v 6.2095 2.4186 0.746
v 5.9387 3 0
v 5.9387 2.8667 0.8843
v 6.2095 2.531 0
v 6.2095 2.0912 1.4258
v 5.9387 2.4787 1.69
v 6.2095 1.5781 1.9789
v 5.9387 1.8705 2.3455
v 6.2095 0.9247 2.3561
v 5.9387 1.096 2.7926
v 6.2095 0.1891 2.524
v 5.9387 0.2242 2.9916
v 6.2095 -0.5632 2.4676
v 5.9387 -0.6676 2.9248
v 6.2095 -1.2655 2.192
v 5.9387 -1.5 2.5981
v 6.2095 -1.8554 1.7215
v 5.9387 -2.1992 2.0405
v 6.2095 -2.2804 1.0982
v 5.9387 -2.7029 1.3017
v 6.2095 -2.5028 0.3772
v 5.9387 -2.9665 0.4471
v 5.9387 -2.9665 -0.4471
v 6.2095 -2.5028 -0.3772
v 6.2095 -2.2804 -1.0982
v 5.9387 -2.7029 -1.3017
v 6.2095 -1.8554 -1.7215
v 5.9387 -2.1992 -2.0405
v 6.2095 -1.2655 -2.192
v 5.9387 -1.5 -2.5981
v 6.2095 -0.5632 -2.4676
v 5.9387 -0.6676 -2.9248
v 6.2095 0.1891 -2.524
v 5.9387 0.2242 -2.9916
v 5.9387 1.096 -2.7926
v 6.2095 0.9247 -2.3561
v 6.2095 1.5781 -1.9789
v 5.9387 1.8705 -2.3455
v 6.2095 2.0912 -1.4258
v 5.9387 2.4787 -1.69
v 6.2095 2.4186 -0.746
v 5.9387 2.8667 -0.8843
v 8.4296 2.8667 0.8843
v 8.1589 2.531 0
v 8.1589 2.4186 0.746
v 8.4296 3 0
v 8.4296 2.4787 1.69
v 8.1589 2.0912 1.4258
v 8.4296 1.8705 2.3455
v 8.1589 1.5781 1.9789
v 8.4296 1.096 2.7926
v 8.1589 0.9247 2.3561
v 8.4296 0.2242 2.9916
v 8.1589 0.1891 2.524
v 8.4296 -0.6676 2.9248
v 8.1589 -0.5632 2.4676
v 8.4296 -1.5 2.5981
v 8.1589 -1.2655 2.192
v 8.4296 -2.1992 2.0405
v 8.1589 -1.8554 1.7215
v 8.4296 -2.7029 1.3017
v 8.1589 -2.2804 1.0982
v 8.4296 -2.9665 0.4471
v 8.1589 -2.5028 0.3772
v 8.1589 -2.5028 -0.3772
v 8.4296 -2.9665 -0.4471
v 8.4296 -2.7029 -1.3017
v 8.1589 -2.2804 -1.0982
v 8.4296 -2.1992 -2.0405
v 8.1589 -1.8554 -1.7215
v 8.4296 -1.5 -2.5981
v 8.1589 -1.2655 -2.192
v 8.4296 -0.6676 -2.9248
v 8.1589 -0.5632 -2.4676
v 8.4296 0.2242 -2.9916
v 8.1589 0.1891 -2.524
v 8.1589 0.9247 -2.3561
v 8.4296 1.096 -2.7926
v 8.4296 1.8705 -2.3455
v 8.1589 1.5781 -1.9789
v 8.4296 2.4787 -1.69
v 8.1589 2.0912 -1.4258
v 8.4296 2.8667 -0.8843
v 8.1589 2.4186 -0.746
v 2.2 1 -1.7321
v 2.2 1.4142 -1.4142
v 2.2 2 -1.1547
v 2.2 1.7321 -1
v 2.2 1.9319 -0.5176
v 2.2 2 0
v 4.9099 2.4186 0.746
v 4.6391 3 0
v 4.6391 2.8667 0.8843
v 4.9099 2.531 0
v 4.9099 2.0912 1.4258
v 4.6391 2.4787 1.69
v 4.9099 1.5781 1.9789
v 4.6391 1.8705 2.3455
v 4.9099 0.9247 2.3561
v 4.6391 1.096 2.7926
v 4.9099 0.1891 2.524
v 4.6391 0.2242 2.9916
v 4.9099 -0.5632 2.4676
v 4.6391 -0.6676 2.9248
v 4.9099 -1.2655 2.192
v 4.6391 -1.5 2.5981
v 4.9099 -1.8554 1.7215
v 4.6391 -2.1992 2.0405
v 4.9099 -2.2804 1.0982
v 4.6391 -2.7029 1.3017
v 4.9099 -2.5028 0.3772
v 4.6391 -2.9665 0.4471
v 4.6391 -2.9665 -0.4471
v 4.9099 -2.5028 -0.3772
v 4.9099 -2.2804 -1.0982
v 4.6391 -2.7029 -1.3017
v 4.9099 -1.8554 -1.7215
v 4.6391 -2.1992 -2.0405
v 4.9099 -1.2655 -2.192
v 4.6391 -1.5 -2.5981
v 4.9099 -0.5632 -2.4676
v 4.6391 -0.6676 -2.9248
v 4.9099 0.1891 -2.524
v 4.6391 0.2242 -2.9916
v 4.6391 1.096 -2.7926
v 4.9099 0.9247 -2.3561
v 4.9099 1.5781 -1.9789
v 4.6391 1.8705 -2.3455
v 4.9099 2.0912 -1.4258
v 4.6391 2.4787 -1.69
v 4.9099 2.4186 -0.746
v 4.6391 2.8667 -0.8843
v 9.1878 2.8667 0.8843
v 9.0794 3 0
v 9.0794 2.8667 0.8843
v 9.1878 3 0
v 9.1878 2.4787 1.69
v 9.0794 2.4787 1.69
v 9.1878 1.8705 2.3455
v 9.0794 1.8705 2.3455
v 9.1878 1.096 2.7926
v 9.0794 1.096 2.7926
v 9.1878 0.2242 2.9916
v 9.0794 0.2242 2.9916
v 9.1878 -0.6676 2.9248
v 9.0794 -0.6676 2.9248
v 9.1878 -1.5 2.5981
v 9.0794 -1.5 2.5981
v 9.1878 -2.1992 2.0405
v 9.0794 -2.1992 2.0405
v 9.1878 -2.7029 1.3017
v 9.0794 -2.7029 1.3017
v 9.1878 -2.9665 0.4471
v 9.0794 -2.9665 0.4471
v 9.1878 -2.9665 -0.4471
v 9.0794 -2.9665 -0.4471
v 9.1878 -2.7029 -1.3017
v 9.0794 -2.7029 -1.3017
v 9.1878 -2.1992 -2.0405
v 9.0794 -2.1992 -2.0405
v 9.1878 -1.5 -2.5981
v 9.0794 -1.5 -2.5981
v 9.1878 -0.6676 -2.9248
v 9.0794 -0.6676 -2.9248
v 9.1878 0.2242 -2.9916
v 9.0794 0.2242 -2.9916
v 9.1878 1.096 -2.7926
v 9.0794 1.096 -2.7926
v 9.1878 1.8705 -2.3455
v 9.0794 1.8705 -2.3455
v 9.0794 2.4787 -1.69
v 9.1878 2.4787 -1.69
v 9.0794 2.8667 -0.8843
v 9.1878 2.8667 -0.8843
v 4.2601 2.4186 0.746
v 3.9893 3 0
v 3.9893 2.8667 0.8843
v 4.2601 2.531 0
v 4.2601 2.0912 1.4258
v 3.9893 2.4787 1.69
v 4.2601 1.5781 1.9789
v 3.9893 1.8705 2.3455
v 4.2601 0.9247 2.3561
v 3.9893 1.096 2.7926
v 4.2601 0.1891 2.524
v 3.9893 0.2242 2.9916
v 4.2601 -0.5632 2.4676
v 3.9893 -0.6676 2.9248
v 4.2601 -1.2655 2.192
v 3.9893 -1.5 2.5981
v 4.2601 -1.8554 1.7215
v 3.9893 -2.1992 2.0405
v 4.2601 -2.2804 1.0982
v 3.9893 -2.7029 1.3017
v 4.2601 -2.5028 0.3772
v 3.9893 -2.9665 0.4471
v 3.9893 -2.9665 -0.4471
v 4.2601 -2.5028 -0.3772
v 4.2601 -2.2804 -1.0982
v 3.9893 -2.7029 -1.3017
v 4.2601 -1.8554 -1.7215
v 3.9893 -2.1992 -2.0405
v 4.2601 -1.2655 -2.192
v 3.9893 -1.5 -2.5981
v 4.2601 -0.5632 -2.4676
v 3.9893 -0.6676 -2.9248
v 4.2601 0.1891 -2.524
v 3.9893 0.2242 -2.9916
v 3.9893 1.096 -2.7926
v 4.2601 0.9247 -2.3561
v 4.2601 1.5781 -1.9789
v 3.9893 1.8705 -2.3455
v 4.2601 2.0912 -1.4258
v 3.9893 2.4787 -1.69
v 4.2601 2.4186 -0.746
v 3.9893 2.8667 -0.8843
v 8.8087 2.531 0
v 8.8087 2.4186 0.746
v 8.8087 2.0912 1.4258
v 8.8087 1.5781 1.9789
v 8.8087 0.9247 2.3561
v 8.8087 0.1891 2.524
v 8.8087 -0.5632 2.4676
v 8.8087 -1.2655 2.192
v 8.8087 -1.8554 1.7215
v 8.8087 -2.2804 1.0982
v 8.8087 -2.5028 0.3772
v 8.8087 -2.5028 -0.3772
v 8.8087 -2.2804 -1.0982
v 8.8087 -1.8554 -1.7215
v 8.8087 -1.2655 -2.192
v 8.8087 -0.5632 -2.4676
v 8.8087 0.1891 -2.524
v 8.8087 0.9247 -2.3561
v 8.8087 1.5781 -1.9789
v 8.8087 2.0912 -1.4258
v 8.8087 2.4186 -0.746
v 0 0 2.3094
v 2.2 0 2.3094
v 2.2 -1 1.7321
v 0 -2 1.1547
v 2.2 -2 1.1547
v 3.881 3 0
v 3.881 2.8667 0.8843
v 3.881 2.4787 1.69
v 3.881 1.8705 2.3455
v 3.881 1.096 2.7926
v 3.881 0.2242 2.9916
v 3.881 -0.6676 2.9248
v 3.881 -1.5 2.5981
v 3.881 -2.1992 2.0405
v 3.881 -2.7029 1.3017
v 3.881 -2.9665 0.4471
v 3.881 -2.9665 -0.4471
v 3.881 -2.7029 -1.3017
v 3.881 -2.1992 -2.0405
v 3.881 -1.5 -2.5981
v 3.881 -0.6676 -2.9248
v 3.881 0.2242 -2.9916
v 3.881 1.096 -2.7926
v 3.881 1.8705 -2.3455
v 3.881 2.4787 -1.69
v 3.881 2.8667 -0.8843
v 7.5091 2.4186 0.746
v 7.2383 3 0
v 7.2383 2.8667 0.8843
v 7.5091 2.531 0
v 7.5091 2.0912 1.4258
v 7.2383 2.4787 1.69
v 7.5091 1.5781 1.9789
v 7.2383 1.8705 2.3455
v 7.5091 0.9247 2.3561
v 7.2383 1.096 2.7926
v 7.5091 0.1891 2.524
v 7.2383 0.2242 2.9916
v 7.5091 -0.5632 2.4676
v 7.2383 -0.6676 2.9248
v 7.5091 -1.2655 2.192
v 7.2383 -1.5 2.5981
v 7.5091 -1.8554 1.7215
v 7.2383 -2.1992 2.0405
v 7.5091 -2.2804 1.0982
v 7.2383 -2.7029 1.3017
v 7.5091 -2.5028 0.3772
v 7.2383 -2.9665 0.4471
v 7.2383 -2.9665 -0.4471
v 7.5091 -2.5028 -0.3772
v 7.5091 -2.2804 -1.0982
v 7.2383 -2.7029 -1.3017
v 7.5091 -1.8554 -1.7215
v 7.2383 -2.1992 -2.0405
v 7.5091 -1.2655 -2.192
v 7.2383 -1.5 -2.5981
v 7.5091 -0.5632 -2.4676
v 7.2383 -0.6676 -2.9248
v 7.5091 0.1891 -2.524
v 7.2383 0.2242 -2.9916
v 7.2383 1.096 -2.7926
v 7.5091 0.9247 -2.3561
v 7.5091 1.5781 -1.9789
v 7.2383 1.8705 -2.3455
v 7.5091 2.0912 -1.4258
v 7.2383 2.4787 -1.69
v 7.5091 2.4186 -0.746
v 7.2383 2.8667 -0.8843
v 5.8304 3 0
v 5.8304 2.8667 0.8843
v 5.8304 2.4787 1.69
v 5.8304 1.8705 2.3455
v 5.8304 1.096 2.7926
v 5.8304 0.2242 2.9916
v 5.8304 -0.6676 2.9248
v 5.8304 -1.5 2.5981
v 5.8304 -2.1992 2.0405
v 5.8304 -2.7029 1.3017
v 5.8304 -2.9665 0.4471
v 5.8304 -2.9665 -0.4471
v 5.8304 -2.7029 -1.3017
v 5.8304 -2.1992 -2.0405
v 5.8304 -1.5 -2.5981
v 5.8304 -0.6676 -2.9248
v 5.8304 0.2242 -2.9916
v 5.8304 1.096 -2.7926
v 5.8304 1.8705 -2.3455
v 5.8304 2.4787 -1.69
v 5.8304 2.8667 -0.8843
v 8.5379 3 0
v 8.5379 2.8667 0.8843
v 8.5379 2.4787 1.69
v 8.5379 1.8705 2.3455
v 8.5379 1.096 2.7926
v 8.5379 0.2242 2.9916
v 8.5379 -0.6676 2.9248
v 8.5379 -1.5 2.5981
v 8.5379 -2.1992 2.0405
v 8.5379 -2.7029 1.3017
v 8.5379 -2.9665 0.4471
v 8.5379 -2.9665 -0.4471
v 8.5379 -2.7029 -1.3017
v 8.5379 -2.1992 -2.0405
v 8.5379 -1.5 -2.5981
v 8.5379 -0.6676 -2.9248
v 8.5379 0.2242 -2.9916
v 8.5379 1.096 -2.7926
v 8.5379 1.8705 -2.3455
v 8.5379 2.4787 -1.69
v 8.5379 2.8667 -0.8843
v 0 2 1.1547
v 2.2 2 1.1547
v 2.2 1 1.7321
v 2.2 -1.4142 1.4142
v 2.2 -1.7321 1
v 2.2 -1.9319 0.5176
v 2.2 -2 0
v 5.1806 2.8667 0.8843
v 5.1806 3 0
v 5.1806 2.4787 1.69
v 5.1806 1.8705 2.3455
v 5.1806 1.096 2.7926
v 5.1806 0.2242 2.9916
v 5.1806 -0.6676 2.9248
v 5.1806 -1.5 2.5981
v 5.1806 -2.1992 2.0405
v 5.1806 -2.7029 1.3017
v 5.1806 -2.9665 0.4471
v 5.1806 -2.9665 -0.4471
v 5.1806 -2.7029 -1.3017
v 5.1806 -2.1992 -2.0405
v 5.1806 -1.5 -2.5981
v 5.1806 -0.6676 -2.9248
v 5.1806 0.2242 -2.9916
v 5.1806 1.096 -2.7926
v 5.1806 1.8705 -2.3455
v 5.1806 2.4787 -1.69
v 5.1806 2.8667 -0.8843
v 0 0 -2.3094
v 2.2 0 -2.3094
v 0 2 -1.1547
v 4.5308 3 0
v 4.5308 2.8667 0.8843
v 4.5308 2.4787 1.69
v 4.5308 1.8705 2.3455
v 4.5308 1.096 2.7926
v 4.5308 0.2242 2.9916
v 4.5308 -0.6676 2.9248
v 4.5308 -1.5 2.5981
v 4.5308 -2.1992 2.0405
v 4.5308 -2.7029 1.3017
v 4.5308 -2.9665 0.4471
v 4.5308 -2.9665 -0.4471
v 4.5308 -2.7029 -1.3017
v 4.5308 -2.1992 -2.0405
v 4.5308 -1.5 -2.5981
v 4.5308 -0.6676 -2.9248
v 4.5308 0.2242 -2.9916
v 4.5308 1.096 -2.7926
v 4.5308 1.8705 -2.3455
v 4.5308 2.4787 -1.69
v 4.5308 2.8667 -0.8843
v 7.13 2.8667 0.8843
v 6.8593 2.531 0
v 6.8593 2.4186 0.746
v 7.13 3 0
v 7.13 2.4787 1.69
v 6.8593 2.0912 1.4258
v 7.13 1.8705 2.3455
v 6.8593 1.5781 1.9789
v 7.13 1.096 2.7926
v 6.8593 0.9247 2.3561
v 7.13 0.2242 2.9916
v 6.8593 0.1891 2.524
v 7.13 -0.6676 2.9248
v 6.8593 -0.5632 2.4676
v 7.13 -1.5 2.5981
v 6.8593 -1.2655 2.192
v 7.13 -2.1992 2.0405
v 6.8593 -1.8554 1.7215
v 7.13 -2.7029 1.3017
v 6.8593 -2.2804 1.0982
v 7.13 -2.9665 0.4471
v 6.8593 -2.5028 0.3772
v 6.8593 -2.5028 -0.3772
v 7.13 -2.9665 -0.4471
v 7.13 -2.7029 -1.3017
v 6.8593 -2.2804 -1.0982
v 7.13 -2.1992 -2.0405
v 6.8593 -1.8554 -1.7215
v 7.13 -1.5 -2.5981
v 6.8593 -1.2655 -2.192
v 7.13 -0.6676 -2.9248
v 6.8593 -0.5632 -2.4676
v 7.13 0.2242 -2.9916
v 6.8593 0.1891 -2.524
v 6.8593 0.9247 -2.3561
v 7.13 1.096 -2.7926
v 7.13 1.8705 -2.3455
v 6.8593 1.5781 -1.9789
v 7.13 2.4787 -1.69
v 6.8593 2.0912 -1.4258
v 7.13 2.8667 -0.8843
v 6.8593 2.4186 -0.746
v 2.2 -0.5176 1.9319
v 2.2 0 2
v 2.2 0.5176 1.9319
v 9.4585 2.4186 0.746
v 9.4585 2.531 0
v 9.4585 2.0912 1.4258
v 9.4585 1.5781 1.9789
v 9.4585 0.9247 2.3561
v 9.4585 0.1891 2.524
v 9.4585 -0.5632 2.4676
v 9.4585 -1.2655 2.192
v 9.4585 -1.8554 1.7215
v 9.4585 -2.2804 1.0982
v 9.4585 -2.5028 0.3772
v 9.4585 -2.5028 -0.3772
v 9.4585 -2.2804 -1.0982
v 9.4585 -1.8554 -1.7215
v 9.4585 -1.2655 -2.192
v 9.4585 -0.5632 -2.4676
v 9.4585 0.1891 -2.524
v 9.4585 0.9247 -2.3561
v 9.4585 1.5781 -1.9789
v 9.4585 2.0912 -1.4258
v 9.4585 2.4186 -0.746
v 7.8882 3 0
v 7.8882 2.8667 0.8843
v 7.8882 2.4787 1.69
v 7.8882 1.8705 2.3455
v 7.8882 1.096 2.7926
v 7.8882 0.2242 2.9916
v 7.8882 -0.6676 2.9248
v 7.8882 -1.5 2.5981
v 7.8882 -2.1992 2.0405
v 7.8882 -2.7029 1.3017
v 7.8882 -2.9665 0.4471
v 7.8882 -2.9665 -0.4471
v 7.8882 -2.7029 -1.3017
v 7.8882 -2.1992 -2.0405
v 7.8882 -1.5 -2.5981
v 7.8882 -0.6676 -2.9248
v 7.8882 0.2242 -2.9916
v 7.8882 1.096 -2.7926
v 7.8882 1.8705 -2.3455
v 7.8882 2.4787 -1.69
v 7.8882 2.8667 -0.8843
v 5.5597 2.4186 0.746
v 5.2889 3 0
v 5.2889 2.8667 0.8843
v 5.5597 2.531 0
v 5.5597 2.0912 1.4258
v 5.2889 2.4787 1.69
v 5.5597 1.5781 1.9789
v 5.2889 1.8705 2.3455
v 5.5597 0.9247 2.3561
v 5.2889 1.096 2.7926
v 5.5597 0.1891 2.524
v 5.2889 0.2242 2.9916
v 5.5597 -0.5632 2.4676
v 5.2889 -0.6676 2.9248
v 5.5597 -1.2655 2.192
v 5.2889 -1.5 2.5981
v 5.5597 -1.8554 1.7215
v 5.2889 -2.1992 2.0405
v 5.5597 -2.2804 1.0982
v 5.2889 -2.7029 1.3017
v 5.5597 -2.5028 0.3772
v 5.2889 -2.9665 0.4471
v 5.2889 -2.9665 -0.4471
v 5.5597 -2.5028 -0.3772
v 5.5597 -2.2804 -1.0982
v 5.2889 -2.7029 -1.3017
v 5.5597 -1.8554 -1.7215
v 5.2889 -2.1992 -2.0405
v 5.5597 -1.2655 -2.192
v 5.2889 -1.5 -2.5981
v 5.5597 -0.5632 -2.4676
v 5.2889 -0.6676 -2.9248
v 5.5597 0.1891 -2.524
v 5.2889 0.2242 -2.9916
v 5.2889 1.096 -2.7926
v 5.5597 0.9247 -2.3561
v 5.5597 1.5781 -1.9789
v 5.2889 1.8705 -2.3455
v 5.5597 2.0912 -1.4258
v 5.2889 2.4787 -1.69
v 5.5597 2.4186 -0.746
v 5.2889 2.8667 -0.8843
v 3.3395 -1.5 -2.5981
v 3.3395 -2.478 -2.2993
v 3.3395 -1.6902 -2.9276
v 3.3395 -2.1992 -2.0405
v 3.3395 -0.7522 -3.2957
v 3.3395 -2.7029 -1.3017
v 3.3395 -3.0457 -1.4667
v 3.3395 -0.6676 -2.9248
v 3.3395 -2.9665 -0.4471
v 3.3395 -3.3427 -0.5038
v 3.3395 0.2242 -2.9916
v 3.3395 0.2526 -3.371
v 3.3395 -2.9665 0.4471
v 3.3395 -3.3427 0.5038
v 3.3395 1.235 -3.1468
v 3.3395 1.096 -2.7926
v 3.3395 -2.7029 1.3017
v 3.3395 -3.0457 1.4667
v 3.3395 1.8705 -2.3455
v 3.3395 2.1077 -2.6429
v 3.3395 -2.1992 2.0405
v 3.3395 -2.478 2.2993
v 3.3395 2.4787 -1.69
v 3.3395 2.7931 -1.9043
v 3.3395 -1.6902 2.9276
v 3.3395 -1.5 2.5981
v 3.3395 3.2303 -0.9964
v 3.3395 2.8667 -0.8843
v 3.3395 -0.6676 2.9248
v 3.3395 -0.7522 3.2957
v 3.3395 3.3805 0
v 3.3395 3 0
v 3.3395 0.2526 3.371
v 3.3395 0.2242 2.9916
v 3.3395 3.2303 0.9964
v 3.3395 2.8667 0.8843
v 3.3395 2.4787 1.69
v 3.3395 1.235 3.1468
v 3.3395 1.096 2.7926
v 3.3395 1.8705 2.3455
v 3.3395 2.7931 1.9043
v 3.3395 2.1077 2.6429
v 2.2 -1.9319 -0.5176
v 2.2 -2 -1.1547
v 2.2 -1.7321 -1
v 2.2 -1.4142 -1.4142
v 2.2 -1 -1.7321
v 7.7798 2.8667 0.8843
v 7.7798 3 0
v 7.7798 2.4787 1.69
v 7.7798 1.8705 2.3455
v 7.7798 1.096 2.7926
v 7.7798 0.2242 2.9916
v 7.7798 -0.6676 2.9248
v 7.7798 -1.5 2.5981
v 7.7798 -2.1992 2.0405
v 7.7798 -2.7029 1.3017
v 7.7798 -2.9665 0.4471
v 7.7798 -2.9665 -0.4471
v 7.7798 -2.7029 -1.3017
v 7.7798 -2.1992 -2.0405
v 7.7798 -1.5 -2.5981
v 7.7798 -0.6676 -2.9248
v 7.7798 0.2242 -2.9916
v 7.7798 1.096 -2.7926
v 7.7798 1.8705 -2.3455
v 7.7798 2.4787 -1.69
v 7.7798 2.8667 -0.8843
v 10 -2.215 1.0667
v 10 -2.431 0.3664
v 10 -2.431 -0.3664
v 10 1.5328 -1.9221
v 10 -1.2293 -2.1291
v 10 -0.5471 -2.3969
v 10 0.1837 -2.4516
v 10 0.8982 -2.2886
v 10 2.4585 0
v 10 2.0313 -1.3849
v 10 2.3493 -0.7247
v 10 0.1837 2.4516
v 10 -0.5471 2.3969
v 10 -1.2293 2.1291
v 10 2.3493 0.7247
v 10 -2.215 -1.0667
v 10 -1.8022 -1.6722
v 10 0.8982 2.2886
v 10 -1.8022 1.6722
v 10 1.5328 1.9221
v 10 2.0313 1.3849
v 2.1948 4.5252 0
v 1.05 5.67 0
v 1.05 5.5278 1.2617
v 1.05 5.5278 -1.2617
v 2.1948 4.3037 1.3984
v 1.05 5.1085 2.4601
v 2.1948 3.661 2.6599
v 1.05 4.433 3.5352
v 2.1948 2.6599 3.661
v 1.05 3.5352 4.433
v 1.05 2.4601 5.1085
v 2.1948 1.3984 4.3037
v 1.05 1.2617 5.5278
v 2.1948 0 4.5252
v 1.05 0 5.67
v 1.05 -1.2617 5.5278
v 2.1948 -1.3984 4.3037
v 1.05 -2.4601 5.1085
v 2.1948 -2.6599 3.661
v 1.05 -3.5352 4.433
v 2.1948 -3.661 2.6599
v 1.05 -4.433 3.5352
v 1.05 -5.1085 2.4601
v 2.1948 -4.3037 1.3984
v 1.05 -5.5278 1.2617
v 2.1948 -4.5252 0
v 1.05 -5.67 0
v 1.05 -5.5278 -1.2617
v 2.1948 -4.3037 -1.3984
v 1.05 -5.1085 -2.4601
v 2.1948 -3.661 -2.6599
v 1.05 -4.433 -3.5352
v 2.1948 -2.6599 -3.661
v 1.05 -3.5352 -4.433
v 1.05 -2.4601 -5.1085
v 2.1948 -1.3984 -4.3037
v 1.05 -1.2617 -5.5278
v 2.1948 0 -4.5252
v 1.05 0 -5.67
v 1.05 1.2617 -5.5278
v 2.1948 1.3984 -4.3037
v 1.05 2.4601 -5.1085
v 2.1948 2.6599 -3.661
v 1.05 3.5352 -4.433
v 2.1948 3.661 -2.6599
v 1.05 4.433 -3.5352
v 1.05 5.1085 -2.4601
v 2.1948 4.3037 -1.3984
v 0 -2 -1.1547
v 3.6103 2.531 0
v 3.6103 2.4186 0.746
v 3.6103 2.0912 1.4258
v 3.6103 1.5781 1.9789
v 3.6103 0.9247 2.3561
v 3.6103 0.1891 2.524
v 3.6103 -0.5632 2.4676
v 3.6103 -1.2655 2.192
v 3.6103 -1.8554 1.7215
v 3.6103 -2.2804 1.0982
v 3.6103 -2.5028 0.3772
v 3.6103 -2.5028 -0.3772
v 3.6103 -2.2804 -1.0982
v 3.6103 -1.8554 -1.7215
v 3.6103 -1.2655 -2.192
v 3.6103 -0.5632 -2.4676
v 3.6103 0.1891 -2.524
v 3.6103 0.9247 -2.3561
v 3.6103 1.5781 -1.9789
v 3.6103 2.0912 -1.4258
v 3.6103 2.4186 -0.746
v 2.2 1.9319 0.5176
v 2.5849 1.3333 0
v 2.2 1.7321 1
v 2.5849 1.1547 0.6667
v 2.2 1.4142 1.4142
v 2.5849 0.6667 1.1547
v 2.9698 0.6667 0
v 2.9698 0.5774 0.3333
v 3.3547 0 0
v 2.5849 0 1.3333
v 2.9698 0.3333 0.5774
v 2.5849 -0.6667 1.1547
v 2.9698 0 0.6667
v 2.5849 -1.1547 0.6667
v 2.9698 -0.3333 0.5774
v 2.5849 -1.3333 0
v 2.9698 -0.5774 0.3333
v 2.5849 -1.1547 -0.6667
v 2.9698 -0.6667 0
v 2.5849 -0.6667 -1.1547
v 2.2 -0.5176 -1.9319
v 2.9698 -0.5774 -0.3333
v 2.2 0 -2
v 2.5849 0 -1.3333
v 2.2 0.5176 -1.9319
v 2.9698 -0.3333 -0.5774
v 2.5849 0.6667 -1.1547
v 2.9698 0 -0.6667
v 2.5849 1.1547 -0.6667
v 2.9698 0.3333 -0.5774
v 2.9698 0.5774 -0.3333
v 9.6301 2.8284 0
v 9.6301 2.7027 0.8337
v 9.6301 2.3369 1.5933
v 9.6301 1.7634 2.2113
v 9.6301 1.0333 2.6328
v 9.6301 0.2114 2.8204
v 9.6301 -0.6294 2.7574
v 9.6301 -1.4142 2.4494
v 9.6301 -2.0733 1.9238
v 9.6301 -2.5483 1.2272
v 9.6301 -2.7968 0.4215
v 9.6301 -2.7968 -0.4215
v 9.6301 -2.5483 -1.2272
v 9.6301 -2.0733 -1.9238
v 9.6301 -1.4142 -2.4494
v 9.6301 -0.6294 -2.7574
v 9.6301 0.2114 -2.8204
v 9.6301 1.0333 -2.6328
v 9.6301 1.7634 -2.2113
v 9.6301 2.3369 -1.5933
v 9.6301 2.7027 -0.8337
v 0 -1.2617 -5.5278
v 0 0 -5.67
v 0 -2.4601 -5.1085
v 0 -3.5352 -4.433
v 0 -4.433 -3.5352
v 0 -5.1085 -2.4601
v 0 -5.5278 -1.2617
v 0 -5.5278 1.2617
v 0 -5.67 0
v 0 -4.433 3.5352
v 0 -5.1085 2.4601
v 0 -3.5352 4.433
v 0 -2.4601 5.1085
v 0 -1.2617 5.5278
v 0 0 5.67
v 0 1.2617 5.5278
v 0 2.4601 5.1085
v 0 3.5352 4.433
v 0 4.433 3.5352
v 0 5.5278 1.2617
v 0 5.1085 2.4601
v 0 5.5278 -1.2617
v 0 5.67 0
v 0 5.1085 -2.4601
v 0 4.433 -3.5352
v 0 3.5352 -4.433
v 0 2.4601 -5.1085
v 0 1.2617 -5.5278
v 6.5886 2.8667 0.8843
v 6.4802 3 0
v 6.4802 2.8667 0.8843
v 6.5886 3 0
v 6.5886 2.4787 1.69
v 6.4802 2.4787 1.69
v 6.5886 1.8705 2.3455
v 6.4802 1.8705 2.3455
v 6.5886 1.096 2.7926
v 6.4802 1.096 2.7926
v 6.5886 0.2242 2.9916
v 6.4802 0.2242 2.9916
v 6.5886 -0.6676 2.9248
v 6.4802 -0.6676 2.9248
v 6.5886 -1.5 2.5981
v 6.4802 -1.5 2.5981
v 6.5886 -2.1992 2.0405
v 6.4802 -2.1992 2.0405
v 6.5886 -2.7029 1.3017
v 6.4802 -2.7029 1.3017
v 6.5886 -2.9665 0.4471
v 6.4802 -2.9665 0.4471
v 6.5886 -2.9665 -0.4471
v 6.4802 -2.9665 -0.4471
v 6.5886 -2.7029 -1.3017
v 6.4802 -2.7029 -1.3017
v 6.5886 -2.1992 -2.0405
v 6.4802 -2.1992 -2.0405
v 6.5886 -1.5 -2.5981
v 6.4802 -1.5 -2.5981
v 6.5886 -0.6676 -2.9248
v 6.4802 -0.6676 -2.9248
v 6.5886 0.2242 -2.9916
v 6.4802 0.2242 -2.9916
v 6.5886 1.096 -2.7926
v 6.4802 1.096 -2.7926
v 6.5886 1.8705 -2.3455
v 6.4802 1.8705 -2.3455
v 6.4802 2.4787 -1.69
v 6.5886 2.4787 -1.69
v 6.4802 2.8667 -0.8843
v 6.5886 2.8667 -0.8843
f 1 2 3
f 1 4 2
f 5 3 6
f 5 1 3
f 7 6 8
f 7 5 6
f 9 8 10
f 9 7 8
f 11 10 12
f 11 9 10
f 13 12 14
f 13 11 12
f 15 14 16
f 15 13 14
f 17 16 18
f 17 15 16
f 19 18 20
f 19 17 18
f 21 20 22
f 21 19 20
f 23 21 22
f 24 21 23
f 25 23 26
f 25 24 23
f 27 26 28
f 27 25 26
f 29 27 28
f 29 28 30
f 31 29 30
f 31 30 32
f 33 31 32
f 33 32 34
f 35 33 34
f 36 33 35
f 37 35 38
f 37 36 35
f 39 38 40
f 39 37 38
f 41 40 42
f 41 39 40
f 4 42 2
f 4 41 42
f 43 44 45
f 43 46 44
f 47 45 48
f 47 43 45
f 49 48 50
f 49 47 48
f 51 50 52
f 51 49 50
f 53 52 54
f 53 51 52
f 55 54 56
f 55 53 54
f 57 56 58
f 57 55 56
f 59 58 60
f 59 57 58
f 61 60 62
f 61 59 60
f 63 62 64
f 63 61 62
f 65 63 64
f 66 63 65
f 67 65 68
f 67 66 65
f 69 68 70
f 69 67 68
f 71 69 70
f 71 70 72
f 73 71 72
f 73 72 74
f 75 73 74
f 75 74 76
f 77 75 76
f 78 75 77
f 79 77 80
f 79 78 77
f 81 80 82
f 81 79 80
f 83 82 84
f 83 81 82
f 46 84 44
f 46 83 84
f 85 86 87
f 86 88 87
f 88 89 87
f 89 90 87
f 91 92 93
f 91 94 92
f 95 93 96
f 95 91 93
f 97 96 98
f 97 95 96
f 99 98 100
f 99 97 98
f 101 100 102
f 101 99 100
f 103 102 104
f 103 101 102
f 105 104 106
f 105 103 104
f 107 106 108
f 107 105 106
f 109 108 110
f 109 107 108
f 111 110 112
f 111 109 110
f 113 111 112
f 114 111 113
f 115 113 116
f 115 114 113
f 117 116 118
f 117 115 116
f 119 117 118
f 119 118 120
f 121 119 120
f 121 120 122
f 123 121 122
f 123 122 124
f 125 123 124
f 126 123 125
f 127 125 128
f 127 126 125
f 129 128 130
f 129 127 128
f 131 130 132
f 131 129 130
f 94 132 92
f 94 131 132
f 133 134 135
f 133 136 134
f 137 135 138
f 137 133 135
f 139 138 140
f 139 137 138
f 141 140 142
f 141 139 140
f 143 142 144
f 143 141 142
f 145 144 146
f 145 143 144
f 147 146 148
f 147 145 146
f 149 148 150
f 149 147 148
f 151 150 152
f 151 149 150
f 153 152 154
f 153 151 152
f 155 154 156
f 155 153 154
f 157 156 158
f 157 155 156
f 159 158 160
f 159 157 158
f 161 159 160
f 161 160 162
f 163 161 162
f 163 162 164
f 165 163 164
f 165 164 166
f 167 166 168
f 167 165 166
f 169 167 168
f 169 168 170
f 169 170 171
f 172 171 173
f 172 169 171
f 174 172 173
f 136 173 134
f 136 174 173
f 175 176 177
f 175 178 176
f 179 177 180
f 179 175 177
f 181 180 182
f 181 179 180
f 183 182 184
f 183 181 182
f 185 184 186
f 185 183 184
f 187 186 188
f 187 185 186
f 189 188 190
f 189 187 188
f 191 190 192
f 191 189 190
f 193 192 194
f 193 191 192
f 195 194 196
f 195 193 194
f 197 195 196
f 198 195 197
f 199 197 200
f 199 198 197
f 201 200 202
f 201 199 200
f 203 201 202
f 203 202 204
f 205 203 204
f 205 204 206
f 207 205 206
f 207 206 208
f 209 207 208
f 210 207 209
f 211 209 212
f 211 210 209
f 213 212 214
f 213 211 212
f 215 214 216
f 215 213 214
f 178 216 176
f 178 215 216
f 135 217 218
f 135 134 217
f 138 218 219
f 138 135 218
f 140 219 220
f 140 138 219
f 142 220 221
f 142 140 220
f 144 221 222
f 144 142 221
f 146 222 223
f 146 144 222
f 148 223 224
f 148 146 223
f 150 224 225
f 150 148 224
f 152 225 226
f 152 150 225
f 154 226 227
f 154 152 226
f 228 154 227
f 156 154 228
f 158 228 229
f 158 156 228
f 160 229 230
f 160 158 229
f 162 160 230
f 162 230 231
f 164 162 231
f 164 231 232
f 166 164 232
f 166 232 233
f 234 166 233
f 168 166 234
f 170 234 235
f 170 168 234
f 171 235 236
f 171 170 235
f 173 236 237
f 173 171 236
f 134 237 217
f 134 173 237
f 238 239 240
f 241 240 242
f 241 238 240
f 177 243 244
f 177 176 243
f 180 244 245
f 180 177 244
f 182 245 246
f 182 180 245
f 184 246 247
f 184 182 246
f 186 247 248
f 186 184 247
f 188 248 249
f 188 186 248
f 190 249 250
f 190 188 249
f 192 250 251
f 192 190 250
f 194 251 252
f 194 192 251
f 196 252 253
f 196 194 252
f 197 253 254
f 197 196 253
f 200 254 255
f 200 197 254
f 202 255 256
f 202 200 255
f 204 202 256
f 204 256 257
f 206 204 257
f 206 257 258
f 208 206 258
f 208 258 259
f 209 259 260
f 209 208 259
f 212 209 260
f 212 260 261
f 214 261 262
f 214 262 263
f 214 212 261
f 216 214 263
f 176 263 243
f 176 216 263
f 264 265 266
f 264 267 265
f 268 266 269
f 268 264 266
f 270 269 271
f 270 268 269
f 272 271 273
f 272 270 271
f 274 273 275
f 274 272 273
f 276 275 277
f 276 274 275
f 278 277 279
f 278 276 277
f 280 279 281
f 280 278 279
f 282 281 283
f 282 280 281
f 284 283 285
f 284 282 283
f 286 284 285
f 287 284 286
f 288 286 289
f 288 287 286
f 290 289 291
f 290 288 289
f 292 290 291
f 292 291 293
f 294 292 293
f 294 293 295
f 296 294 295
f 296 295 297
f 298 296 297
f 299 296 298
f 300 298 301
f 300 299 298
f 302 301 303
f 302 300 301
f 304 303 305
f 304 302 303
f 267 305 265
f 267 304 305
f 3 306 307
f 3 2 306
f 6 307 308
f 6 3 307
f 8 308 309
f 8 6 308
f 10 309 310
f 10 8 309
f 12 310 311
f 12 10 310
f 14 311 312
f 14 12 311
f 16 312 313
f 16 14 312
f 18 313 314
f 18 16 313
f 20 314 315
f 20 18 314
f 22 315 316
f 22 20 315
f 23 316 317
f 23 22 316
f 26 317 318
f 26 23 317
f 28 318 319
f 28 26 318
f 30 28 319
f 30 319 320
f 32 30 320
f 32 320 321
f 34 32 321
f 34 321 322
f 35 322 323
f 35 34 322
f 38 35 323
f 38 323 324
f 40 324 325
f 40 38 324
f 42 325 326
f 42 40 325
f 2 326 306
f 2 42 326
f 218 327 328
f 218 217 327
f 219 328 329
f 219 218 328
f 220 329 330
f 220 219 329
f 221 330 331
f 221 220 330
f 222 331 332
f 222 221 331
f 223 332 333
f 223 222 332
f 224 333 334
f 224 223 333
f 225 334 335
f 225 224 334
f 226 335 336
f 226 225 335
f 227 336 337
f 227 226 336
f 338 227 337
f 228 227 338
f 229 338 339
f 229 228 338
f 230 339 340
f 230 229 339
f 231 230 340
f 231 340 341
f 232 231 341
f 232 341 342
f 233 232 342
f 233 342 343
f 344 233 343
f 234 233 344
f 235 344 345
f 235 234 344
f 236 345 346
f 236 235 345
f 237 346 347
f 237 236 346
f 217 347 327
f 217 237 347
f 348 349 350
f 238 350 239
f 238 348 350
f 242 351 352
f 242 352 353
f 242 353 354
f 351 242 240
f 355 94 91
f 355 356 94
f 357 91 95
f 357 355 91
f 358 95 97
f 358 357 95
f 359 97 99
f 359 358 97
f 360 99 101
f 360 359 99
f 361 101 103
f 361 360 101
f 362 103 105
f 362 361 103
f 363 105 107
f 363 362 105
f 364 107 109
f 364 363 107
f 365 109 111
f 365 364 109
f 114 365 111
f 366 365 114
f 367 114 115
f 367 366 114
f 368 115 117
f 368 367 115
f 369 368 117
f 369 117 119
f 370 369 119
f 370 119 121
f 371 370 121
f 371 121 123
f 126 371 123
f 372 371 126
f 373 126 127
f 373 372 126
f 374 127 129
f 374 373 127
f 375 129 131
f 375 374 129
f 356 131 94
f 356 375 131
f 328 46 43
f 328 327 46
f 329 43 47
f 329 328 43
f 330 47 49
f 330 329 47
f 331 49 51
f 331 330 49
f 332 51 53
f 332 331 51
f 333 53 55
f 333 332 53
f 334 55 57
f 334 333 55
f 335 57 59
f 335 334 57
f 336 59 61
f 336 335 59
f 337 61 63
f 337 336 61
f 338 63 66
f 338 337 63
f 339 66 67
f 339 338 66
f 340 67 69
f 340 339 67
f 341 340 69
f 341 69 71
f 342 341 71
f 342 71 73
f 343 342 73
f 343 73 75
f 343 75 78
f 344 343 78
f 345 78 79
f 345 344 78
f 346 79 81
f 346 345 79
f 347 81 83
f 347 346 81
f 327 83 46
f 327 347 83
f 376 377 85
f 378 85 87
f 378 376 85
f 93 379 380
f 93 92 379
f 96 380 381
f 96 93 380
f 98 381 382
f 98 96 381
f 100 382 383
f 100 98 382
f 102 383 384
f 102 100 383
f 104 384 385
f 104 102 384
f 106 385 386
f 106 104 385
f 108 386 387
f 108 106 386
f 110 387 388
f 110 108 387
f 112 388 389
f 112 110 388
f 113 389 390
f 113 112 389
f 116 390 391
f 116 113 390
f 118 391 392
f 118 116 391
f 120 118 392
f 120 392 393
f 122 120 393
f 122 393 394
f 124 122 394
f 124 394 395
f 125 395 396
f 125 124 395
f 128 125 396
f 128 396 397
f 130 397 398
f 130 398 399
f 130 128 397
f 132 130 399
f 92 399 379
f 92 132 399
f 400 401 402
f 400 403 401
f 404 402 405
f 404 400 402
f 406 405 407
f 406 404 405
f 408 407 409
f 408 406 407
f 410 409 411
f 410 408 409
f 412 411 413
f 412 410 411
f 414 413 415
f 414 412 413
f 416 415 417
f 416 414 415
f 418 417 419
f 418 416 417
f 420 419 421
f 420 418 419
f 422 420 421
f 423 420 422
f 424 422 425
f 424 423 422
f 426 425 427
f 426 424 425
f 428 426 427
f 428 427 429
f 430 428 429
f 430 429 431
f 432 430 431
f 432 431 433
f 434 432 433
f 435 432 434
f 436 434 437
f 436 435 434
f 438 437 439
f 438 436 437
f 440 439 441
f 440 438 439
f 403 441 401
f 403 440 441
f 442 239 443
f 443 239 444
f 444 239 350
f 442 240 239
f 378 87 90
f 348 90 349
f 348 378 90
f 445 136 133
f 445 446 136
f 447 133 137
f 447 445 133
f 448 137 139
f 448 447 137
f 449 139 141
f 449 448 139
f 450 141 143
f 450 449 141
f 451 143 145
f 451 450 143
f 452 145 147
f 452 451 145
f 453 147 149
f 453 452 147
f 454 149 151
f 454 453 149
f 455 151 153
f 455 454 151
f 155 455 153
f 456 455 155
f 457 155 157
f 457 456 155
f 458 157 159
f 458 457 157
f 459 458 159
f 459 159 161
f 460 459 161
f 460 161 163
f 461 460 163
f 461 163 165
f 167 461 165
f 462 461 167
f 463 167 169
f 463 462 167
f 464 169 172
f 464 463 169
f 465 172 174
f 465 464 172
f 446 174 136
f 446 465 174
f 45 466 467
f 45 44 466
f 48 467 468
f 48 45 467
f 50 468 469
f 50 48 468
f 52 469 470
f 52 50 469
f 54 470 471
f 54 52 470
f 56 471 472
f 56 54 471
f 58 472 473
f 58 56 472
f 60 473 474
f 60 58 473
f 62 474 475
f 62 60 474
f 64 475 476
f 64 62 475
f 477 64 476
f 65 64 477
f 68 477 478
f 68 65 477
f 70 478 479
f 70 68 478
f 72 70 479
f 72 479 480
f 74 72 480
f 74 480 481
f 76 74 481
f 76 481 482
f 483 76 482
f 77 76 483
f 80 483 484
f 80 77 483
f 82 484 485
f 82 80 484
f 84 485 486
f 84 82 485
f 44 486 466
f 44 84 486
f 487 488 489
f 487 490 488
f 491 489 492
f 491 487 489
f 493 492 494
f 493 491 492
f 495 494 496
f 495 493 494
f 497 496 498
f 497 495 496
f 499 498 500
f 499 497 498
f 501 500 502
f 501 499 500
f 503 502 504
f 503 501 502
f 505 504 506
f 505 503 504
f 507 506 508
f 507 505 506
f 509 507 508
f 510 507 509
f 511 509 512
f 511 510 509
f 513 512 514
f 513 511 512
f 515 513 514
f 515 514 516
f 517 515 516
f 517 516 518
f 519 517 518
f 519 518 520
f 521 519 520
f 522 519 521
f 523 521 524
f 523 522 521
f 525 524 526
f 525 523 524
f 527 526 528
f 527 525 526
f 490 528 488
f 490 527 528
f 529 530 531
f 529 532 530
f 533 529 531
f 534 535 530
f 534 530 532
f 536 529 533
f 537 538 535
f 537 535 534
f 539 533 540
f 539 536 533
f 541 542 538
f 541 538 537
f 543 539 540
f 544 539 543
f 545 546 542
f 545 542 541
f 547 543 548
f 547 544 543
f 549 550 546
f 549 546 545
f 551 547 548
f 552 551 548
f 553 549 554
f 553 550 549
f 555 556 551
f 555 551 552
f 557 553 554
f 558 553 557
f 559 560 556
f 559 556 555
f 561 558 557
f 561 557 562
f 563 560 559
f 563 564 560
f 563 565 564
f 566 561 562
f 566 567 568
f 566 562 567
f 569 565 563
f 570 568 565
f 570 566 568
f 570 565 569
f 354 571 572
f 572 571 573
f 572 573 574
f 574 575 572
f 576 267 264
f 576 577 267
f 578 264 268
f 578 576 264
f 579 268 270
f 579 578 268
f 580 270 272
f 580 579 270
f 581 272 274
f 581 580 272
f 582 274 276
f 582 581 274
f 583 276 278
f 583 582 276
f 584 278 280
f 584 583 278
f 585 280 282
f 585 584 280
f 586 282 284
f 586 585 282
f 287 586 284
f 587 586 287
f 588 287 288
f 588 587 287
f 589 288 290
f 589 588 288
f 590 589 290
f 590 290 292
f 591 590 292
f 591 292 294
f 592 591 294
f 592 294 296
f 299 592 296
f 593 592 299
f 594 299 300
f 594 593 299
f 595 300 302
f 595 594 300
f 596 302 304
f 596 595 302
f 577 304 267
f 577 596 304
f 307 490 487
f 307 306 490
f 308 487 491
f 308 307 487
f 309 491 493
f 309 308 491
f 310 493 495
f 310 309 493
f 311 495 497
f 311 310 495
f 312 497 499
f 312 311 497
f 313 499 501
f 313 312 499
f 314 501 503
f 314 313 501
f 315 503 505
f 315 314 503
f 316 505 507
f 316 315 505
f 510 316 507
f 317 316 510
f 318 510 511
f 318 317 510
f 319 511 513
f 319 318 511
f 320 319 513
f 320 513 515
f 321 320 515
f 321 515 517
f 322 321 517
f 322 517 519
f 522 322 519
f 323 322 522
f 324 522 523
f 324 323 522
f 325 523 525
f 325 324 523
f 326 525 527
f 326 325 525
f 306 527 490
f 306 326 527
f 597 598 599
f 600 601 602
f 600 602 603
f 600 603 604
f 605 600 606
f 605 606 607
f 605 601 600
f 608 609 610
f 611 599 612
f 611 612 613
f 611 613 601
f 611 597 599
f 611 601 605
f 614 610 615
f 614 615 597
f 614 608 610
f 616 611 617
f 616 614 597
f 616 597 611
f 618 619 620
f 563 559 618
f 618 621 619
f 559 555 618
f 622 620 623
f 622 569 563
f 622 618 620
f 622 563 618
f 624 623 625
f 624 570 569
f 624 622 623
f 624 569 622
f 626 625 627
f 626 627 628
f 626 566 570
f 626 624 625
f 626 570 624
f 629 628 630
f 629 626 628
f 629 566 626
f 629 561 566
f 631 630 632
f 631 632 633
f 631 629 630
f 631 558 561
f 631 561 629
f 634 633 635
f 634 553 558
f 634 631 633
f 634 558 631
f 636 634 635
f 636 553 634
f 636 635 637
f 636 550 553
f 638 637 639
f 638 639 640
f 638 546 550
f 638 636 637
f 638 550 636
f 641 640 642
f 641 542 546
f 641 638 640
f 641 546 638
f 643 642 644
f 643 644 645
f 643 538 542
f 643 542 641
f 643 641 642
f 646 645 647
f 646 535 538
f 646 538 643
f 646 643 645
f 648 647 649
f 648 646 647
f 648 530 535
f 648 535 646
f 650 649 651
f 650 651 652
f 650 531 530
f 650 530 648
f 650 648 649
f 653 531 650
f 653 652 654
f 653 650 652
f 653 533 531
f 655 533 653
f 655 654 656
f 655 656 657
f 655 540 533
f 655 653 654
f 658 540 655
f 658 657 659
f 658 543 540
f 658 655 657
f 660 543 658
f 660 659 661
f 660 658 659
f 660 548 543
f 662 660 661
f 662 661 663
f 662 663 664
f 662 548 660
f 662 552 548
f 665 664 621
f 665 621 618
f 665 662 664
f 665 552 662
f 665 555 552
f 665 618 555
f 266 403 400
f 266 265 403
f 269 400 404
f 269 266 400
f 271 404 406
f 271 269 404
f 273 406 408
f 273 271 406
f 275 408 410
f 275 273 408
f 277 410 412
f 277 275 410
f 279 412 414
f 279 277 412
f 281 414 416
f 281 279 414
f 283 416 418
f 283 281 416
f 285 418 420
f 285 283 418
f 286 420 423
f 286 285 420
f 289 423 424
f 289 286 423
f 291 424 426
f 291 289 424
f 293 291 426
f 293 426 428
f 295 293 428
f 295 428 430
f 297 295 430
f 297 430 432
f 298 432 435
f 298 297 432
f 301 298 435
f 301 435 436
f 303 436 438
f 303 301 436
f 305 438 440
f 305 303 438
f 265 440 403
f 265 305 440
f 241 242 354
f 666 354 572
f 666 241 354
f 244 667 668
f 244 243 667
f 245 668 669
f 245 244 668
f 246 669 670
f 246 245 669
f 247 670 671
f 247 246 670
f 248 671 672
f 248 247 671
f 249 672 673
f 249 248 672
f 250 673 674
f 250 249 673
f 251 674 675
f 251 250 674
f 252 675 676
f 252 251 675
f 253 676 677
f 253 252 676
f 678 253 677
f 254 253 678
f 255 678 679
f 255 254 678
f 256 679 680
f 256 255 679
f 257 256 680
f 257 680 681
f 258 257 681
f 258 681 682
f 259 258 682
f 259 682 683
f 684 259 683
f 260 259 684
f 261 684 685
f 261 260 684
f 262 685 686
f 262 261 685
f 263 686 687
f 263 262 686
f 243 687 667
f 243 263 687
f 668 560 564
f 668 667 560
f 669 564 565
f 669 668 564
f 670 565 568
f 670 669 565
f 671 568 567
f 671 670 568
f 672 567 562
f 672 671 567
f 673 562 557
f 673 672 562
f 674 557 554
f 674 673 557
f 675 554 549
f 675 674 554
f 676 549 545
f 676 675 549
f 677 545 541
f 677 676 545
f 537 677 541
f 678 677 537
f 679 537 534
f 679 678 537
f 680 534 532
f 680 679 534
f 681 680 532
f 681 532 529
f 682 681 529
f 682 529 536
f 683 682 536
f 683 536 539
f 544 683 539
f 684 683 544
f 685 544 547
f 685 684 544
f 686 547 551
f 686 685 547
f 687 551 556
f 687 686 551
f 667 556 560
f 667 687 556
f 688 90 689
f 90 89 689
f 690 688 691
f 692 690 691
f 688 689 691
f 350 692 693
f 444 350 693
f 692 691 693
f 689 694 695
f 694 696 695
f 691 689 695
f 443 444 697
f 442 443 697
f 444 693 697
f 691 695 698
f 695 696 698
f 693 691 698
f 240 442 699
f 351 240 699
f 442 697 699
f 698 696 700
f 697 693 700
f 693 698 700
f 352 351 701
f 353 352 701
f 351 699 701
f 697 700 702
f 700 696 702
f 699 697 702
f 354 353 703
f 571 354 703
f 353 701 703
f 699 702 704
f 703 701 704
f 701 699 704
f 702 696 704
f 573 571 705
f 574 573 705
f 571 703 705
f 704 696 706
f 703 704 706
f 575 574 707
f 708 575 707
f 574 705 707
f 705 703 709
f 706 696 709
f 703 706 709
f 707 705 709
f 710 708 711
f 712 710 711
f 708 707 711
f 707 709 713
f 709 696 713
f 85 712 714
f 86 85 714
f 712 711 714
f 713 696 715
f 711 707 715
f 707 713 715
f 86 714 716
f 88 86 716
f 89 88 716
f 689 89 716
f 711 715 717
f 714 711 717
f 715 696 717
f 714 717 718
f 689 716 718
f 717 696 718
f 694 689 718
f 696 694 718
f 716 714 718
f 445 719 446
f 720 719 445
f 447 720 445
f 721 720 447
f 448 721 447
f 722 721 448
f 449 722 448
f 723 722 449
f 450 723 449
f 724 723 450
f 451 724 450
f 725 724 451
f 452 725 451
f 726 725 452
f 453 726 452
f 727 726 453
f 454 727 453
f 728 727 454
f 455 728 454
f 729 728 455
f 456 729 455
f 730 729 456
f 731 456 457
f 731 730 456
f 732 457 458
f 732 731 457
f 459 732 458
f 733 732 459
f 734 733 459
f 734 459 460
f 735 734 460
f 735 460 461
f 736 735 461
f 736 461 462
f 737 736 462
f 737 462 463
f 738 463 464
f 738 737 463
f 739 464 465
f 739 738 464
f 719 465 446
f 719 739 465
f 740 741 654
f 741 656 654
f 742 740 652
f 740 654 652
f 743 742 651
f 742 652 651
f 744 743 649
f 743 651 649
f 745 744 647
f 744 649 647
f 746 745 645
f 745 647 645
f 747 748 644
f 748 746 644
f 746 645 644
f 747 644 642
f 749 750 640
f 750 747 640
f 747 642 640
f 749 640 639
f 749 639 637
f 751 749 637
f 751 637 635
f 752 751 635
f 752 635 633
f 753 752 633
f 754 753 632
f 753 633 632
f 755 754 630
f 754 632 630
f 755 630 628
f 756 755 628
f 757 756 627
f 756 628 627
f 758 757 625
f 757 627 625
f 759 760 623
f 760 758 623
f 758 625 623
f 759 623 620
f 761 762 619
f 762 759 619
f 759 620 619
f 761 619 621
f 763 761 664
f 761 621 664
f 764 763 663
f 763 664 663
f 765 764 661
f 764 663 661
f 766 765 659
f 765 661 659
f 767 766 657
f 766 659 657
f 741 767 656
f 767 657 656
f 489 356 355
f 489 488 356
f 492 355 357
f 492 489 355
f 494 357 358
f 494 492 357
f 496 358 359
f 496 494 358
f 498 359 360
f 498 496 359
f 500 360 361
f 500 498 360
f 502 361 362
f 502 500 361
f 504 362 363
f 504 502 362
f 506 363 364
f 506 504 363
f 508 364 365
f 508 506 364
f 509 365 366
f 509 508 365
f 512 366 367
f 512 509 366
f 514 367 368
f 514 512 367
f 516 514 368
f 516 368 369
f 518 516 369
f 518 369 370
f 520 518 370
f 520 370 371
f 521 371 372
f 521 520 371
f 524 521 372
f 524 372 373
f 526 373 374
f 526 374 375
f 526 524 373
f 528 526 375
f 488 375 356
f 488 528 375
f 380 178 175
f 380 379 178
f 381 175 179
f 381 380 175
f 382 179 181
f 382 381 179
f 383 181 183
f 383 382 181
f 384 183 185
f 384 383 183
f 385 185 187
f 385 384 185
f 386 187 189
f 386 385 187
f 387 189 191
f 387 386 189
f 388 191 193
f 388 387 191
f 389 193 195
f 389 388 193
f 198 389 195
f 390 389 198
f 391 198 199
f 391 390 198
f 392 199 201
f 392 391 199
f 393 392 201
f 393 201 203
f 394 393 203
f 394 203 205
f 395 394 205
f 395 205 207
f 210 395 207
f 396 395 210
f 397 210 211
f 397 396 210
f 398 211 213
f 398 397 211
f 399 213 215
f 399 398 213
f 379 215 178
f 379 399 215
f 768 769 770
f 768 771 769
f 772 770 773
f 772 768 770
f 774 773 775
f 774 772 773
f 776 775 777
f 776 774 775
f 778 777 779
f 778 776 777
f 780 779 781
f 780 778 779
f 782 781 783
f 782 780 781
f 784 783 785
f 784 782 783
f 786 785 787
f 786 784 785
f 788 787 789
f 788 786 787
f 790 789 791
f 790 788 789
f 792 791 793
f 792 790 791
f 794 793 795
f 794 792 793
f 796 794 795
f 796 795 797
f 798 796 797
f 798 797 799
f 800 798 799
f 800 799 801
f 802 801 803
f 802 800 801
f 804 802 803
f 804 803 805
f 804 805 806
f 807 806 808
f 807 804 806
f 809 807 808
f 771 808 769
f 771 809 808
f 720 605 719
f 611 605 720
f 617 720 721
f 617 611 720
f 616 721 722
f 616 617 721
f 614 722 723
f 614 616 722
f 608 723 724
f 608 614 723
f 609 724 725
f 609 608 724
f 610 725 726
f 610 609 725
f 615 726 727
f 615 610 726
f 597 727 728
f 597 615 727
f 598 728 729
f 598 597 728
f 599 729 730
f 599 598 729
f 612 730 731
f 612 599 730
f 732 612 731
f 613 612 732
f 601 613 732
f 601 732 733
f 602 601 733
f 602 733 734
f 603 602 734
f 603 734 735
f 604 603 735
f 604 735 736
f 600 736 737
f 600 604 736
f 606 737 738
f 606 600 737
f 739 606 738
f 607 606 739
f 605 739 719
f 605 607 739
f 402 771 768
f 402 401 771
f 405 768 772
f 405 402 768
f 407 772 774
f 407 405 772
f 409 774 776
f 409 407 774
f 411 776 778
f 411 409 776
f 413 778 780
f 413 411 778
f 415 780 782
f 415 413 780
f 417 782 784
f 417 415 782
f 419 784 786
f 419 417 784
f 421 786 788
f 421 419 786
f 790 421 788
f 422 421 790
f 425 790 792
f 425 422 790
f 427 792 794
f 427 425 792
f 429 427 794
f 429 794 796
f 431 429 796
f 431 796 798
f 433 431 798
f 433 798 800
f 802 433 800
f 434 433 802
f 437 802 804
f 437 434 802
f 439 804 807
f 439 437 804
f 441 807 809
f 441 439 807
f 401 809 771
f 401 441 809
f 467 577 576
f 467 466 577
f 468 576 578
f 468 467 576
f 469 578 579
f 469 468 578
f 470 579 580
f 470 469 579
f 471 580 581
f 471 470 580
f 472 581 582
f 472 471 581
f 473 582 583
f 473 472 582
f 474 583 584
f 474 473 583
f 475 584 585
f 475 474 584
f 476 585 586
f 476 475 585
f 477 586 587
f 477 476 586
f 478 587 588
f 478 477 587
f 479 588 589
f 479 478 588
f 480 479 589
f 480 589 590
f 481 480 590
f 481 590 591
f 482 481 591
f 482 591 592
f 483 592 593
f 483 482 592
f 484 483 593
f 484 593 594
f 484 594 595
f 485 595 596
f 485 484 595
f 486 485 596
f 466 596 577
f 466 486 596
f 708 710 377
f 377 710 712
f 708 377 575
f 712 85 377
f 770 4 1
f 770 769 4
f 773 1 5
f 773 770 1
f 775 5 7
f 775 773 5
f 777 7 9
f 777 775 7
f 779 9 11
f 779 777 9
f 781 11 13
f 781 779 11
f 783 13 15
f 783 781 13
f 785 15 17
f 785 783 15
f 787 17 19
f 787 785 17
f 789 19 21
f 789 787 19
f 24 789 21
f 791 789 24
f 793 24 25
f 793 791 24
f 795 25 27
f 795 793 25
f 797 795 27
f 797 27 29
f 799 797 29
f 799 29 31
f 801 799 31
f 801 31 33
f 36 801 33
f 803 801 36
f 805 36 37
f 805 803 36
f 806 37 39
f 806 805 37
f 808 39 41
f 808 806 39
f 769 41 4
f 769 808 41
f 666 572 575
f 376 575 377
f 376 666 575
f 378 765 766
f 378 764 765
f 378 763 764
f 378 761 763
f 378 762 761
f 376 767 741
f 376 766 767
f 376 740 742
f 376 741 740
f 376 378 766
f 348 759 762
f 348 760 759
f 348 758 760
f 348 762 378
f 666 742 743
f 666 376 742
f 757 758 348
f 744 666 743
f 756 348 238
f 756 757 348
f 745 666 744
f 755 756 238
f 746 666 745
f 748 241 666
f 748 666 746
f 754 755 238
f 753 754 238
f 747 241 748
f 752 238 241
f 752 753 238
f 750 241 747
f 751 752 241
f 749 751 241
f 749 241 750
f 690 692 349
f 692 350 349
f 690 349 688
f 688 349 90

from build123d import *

# Parameters (mm, degrees)
HEXAGONSOCKET_DEPTH = 2.2
HEADFILLET_R        = 0.25
CHAMFER_2_SIZE      = 0.5415
SKETCH4_W           = 5
SKETCH4_H           = 5
LPATTERN10_COUNT    = 10
LPATTERN10_PITCH    = 0.6498


with BuildPart() as part:
    # Sketch1 → Base (revolve)
    with BuildSketch(Plane.XY):
        Polygon((0, 0), (0, 6.72), (3.72, 3), (10, 3), (10, 0), align=None)
    revolve(axis=Axis((-0.587069181, 0, 0), (1, 0, 0)))

    # Sketch2 → HexagonSocket (cut)
    with BuildSketch(Plane(origin=(0, 0, 0), x_dir=(0, 0, -1), z_dir=(1, 0, 0))):
        Polygon((2.309401077, 0), (1.154700538, 2), (-1.154700538, 2), (-2.309401077, 0), (-1.154700538, -2), (1.154700538, -2), align=None)
    extrude(amount=HEXAGONSOCKET_DEPTH, mode=Mode.SUBTRACT)

    # Sketch3 → Cut-Revolve1 (revolve, cut)
    with BuildSketch(Plane.XY):
        Polygon((2.2, 2), (3.354700538, 0), (2.2, 0), align=None)
    revolve(axis=Axis((-0.439109555, 0, 0), (1, 0, 0)), mode=Mode.SUBTRACT)

    # HeadFillet
    headfillet_edges = [part.edges().sort_by_distance(p)[0] for p in [
        (3.72, -3, 0),
    ]]
    fillet(headfillet_edges, radius=HEADFILLET_R)

    # Chamfer 2
    chamfer_2_edges = [part.edges().sort_by_distance(p)[0] for p in [
        (10, -3, 0),
    ]]
    chamfer(chamfer_2_edges, length=CHAMFER_2_SIZE)

    # Sketch4 → Cut-Revolve2 (revolve, cut)
    with BuildSketch(Plane(origin=(0, 0, 0), x_dir=(1, 0, 0), z_dir=(0, 1, 0))):
        with Locations((0.5, 8.17)):
            Rectangle(SKETCH4_W, SKETCH4_H)
    revolve(axis=Axis((11.853138686, 0, 0), (-1, 0, 0)), mode=Mode.SUBTRACT)

    # Sketch5 → Cut-Revolve10 (revolve, cut)
    with BuildSketch(Plane.XY):
        Polygon((9.4585, 2.531047244), (9.72925, 3), (9.72925, 3.5415), (9.18775, 3.5415), (9.18775, 3), align=None)
    cut_revolve10 = revolve(axis=Axis((0, 0, 0), (1, 0, 0)), mode=Mode.SUBTRACT)

    # LPattern10: Cut-Revolve10 ×10
    with Locations(*[(-i * LPATTERN10_PITCH, 0, 0) for i in range(1, LPATTERN10_COUNT)]):
        add(cut_revolve10, mode=Mode.SUBTRACT)


solid = part.part
